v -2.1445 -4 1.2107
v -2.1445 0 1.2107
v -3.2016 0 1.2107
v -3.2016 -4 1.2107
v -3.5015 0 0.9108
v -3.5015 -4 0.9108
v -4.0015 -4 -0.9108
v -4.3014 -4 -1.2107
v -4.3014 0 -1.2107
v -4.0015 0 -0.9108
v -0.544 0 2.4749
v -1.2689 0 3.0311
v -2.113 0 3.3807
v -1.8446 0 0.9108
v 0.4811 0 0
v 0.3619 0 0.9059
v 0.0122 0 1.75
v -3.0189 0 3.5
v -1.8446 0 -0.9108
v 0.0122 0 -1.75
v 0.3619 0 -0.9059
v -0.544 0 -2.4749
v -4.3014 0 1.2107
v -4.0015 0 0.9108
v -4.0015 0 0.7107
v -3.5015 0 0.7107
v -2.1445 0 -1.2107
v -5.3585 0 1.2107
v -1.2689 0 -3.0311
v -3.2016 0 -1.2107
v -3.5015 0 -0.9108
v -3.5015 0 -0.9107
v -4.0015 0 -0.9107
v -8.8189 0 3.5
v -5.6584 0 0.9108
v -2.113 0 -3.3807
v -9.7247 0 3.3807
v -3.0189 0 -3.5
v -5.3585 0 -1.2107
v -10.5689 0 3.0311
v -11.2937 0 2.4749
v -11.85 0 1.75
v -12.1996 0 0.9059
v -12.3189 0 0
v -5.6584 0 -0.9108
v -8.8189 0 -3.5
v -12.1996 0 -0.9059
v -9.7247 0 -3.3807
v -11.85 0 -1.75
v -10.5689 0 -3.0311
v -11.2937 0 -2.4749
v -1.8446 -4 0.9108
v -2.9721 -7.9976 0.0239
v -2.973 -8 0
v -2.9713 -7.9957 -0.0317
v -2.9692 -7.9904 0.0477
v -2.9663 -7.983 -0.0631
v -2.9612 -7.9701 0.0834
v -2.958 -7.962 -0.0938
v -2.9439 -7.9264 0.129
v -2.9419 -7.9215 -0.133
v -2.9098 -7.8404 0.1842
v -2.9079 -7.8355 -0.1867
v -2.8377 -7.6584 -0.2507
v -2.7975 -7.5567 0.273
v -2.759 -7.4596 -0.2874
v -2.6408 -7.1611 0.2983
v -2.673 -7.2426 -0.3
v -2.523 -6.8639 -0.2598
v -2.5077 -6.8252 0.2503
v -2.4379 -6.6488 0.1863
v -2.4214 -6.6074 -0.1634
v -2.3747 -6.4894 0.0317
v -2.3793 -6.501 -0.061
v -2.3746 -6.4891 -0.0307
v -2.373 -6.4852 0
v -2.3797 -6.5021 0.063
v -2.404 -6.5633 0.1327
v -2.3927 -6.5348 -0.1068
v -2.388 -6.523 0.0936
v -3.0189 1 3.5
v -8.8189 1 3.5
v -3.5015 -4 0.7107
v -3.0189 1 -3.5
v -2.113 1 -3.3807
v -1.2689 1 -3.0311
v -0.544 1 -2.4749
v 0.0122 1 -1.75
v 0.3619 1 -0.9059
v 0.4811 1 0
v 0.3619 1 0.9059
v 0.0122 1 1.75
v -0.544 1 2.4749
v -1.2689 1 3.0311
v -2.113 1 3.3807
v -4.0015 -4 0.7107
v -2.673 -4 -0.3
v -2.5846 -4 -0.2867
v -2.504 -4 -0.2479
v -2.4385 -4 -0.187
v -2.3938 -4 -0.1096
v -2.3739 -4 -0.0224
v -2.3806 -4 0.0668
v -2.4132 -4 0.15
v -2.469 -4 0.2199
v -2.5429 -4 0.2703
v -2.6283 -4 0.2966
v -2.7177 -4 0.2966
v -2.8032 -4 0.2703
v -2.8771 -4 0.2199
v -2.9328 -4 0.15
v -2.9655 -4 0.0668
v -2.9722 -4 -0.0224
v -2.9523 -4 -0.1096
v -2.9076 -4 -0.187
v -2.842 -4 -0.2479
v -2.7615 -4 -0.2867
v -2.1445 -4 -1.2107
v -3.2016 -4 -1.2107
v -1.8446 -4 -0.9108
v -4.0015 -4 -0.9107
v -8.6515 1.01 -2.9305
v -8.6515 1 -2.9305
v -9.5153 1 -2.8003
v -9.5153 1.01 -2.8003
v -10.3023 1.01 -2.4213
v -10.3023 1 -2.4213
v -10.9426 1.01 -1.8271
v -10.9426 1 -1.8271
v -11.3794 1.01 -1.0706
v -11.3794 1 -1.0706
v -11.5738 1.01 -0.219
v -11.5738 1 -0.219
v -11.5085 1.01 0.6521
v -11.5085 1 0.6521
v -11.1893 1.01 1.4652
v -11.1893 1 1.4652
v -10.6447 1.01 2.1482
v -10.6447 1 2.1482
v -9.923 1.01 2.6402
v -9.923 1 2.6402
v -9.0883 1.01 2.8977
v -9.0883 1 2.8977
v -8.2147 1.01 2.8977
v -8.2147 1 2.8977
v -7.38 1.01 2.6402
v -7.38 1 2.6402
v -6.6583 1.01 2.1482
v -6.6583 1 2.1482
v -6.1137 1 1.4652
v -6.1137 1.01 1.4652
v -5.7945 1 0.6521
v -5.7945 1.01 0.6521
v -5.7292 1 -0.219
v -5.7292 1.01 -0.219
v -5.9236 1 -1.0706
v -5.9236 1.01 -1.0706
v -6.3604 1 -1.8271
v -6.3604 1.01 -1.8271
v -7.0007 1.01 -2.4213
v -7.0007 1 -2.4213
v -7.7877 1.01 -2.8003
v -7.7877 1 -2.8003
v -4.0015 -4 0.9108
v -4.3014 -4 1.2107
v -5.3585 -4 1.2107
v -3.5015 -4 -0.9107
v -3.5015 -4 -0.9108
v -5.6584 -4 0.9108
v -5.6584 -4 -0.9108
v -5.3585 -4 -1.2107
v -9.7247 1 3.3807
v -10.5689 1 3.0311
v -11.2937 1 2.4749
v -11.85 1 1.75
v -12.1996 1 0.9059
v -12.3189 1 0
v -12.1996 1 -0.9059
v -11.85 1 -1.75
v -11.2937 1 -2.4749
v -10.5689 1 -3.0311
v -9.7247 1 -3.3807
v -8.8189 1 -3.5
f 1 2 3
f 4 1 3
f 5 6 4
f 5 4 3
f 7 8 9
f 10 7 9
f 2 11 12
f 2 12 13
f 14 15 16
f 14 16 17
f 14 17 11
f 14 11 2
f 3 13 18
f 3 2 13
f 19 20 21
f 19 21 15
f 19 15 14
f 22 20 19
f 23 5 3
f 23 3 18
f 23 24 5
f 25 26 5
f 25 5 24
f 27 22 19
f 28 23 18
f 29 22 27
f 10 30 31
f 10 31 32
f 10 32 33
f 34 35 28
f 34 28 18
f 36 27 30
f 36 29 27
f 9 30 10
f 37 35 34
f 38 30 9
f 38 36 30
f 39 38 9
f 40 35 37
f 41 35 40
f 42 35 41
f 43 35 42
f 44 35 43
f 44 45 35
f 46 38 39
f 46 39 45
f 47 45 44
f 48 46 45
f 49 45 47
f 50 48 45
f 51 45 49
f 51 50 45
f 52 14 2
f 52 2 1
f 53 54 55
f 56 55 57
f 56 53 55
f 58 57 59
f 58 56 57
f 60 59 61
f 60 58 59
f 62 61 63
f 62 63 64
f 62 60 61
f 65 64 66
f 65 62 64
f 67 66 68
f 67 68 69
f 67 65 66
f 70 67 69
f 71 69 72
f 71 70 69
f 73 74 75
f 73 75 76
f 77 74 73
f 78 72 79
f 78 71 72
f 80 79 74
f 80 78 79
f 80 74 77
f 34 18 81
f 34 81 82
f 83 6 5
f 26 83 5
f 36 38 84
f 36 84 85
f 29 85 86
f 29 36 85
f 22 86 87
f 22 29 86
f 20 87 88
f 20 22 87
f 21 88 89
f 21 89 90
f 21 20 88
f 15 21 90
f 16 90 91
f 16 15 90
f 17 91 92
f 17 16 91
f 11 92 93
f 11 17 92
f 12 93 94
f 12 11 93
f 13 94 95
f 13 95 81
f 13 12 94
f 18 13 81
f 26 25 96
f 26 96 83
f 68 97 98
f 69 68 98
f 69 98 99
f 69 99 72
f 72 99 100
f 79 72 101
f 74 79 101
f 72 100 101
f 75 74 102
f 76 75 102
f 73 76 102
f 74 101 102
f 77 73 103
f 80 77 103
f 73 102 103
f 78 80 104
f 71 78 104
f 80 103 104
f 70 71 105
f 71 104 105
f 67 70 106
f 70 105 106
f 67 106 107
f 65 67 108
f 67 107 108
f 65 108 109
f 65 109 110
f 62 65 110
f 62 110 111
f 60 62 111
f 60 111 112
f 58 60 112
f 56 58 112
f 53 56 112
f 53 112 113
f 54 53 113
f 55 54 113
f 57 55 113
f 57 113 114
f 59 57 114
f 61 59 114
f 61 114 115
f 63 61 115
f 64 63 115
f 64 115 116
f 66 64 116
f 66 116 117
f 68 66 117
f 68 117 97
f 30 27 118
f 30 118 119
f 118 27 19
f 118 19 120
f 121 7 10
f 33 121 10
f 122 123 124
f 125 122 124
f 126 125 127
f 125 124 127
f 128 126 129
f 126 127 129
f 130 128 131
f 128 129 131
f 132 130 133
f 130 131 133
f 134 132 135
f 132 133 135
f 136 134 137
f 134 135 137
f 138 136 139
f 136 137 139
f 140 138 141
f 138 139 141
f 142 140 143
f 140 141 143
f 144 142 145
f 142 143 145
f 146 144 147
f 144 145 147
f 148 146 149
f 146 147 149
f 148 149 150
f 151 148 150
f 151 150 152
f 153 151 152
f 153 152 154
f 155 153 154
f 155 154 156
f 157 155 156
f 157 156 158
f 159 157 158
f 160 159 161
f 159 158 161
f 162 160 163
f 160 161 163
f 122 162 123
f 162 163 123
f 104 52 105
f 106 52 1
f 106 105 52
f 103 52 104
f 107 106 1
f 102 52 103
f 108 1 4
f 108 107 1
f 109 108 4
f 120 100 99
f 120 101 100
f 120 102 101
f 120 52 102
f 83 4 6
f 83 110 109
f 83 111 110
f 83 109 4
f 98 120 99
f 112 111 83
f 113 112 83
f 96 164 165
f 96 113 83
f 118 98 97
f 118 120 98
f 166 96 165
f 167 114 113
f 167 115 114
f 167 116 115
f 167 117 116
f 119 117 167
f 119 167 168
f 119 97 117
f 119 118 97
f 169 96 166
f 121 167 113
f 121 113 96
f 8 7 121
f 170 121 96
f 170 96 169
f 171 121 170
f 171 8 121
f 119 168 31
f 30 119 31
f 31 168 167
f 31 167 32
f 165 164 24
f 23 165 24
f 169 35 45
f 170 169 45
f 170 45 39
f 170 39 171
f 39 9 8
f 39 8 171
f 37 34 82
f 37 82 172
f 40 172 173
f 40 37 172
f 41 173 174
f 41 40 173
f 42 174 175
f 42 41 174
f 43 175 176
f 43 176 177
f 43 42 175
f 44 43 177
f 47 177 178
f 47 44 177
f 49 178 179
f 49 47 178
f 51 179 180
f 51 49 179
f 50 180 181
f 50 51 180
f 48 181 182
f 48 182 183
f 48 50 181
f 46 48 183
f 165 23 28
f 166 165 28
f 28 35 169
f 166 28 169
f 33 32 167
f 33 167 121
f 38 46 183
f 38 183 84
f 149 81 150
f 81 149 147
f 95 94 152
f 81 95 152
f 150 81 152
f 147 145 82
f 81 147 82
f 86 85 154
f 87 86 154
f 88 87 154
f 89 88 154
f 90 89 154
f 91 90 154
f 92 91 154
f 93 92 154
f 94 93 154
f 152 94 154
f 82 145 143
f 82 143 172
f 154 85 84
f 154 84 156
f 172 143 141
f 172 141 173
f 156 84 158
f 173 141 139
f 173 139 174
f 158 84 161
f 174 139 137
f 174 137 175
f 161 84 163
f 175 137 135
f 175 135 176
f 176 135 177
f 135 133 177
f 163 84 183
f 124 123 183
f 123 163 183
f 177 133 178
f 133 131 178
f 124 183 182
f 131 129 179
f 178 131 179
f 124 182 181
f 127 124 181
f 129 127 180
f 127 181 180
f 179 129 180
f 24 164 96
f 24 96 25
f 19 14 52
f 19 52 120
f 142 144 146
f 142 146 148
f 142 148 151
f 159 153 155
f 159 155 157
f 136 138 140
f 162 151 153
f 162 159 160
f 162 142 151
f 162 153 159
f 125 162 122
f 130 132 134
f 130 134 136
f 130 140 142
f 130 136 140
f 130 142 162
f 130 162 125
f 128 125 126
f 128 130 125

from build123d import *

# Parameters (mm, degrees)
EXTRUDE_1_DEPTH     = 1
SKETCH_2_R          = 2.930453947
EXTRUDE_2_DEPTH     = 0.01
SKETCH_3_W          = 3.813800337
SKETCH_3_H          = 2.421486406
EXTRUDE_3_DEPTH     = 4
SKETCH_4_W          = 0.5
SKETCH_4_H          = 4
CUT_EXTRUDE_1_DEPTH = 0.3
SKETCH_5_W          = 0.5
SKETCH_5_H          = 4
CUT_EXTRUDE_2_DEPTH = 0.5
CHAMFER_1_SIZE      = 0.3
SKETCH_6_R          = 0.3
EXTRUDE_4_DEPTH     = 4
CUT_EXTRUDE_3_DEPTH = 2


with BuildPart() as part:
    # 草图1 → 凸台-拉伸1 (new body)
    with BuildSketch(Plane(origin=(0, 0, 0), x_dir=(1, 0, 0), z_dir=(0, 1, 0))):
        with BuildLine():
            Line((-8.818862275, 3.5), (-3.018862275, 3.5))
            ThreePointArc((-3.018862275, 3.5), (0.481137725, 0), (-3.018862275, -3.5))
            Line((-3.018862275, -3.5), (-8.818862275, -3.5))
            ThreePointArc((-8.818862275, -3.5), (-12.318862275, 0), (-8.818862275, 3.5))
        make_face()
    extrude(amount=EXTRUDE_1_DEPTH)

    # 草图2 → 凸台-拉伸2 (add)
    with BuildSketch(Plane(origin=(0, 1, 0), x_dir=(1, 0, 0), z_dir=(0, 1, 0))):
        with Locations(Location((-8.651499717, 0, 0), (0, 0, 90))):
            Circle(SKETCH_2_R)
    extrude(amount=EXTRUDE_2_DEPTH)

    # 草图3 → 凸台-拉伸3 (add)
    with BuildSketch(Plane(origin=(0, 0, 0), x_dir=(-1, 0, 0), z_dir=(0, -1, 0))):
        with Locations((3.751479011, 0)):
            Rectangle(SKETCH_3_W, SKETCH_3_H)
    extrude(amount=EXTRUDE_3_DEPTH)

    # 草图4 → 切除-拉伸1 (cut)
    with BuildSketch(Plane(origin=(0, 0, -1.210743203), x_dir=(-1, 0, 0), z_dir=(0, 0, -1))):
        with Locations((3.751479011, -2)):
            Rectangle(SKETCH_4_W, SKETCH_4_H)
    extrude(amount=-CUT_EXTRUDE_1_DEPTH, mode=Mode.SUBTRACT)

    # 草图5 → 切除-拉伸2 (cut)
    with BuildSketch(Plane.XY.offset(1.210743203)):
        with Locations((-3.751479011, -2)):
            Rectangle(SKETCH_5_W, SKETCH_5_H)
    extrude(amount=-CUT_EXTRUDE_2_DEPTH, mode=Mode.SUBTRACT)

    # 倒角1
    chamfer_1_edges = [part.edges().sort_by_distance(p)[0] for p in [
        (-5.658379179, -2, 1.210743203),
        (-5.658379179, -2, -1.210743203),
        (-1.844578842, -2, -1.210743203),
        (-1.844578842, -2, 1.210743203),
        (-4.001479011, -2, -1.210743203),
        (-3.501479011, -2, -1.210743203),
        (-3.501479011, -2, 1.210743203),
        (-4.001479011, -2, 1.210743203),
    ]]
    chamfer(chamfer_1_edges, length=CHAMFER_1_SIZE - 0.0001)  # a hair under: the kernel refuses the full size

    # 草图6 → 凸台-拉伸4 (add)
    with BuildSketch(Plane(origin=(0, -4, 0), x_dir=(-1, 0, 0), z_dir=(0, -1, 0))):
        with Locations(Location((2.673028926, 0, 0), (0, 0, 90))):
            Circle(SKETCH_6_R)
    extrude(amount=EXTRUDE_4_DEPTH)

    # 草图7 → 切除-拉伸3 (cut, symmetric)
    with BuildSketch(Plane.XY):
        Polygon((-2.973028926, -8), (-2.373028926, -6.485168842), (-2.373028926, -8), align=None)
    extrude(amount=CUT_EXTRUDE_3_DEPTH, both=True, mode=Mode.SUBTRACT)


solid = part.part
